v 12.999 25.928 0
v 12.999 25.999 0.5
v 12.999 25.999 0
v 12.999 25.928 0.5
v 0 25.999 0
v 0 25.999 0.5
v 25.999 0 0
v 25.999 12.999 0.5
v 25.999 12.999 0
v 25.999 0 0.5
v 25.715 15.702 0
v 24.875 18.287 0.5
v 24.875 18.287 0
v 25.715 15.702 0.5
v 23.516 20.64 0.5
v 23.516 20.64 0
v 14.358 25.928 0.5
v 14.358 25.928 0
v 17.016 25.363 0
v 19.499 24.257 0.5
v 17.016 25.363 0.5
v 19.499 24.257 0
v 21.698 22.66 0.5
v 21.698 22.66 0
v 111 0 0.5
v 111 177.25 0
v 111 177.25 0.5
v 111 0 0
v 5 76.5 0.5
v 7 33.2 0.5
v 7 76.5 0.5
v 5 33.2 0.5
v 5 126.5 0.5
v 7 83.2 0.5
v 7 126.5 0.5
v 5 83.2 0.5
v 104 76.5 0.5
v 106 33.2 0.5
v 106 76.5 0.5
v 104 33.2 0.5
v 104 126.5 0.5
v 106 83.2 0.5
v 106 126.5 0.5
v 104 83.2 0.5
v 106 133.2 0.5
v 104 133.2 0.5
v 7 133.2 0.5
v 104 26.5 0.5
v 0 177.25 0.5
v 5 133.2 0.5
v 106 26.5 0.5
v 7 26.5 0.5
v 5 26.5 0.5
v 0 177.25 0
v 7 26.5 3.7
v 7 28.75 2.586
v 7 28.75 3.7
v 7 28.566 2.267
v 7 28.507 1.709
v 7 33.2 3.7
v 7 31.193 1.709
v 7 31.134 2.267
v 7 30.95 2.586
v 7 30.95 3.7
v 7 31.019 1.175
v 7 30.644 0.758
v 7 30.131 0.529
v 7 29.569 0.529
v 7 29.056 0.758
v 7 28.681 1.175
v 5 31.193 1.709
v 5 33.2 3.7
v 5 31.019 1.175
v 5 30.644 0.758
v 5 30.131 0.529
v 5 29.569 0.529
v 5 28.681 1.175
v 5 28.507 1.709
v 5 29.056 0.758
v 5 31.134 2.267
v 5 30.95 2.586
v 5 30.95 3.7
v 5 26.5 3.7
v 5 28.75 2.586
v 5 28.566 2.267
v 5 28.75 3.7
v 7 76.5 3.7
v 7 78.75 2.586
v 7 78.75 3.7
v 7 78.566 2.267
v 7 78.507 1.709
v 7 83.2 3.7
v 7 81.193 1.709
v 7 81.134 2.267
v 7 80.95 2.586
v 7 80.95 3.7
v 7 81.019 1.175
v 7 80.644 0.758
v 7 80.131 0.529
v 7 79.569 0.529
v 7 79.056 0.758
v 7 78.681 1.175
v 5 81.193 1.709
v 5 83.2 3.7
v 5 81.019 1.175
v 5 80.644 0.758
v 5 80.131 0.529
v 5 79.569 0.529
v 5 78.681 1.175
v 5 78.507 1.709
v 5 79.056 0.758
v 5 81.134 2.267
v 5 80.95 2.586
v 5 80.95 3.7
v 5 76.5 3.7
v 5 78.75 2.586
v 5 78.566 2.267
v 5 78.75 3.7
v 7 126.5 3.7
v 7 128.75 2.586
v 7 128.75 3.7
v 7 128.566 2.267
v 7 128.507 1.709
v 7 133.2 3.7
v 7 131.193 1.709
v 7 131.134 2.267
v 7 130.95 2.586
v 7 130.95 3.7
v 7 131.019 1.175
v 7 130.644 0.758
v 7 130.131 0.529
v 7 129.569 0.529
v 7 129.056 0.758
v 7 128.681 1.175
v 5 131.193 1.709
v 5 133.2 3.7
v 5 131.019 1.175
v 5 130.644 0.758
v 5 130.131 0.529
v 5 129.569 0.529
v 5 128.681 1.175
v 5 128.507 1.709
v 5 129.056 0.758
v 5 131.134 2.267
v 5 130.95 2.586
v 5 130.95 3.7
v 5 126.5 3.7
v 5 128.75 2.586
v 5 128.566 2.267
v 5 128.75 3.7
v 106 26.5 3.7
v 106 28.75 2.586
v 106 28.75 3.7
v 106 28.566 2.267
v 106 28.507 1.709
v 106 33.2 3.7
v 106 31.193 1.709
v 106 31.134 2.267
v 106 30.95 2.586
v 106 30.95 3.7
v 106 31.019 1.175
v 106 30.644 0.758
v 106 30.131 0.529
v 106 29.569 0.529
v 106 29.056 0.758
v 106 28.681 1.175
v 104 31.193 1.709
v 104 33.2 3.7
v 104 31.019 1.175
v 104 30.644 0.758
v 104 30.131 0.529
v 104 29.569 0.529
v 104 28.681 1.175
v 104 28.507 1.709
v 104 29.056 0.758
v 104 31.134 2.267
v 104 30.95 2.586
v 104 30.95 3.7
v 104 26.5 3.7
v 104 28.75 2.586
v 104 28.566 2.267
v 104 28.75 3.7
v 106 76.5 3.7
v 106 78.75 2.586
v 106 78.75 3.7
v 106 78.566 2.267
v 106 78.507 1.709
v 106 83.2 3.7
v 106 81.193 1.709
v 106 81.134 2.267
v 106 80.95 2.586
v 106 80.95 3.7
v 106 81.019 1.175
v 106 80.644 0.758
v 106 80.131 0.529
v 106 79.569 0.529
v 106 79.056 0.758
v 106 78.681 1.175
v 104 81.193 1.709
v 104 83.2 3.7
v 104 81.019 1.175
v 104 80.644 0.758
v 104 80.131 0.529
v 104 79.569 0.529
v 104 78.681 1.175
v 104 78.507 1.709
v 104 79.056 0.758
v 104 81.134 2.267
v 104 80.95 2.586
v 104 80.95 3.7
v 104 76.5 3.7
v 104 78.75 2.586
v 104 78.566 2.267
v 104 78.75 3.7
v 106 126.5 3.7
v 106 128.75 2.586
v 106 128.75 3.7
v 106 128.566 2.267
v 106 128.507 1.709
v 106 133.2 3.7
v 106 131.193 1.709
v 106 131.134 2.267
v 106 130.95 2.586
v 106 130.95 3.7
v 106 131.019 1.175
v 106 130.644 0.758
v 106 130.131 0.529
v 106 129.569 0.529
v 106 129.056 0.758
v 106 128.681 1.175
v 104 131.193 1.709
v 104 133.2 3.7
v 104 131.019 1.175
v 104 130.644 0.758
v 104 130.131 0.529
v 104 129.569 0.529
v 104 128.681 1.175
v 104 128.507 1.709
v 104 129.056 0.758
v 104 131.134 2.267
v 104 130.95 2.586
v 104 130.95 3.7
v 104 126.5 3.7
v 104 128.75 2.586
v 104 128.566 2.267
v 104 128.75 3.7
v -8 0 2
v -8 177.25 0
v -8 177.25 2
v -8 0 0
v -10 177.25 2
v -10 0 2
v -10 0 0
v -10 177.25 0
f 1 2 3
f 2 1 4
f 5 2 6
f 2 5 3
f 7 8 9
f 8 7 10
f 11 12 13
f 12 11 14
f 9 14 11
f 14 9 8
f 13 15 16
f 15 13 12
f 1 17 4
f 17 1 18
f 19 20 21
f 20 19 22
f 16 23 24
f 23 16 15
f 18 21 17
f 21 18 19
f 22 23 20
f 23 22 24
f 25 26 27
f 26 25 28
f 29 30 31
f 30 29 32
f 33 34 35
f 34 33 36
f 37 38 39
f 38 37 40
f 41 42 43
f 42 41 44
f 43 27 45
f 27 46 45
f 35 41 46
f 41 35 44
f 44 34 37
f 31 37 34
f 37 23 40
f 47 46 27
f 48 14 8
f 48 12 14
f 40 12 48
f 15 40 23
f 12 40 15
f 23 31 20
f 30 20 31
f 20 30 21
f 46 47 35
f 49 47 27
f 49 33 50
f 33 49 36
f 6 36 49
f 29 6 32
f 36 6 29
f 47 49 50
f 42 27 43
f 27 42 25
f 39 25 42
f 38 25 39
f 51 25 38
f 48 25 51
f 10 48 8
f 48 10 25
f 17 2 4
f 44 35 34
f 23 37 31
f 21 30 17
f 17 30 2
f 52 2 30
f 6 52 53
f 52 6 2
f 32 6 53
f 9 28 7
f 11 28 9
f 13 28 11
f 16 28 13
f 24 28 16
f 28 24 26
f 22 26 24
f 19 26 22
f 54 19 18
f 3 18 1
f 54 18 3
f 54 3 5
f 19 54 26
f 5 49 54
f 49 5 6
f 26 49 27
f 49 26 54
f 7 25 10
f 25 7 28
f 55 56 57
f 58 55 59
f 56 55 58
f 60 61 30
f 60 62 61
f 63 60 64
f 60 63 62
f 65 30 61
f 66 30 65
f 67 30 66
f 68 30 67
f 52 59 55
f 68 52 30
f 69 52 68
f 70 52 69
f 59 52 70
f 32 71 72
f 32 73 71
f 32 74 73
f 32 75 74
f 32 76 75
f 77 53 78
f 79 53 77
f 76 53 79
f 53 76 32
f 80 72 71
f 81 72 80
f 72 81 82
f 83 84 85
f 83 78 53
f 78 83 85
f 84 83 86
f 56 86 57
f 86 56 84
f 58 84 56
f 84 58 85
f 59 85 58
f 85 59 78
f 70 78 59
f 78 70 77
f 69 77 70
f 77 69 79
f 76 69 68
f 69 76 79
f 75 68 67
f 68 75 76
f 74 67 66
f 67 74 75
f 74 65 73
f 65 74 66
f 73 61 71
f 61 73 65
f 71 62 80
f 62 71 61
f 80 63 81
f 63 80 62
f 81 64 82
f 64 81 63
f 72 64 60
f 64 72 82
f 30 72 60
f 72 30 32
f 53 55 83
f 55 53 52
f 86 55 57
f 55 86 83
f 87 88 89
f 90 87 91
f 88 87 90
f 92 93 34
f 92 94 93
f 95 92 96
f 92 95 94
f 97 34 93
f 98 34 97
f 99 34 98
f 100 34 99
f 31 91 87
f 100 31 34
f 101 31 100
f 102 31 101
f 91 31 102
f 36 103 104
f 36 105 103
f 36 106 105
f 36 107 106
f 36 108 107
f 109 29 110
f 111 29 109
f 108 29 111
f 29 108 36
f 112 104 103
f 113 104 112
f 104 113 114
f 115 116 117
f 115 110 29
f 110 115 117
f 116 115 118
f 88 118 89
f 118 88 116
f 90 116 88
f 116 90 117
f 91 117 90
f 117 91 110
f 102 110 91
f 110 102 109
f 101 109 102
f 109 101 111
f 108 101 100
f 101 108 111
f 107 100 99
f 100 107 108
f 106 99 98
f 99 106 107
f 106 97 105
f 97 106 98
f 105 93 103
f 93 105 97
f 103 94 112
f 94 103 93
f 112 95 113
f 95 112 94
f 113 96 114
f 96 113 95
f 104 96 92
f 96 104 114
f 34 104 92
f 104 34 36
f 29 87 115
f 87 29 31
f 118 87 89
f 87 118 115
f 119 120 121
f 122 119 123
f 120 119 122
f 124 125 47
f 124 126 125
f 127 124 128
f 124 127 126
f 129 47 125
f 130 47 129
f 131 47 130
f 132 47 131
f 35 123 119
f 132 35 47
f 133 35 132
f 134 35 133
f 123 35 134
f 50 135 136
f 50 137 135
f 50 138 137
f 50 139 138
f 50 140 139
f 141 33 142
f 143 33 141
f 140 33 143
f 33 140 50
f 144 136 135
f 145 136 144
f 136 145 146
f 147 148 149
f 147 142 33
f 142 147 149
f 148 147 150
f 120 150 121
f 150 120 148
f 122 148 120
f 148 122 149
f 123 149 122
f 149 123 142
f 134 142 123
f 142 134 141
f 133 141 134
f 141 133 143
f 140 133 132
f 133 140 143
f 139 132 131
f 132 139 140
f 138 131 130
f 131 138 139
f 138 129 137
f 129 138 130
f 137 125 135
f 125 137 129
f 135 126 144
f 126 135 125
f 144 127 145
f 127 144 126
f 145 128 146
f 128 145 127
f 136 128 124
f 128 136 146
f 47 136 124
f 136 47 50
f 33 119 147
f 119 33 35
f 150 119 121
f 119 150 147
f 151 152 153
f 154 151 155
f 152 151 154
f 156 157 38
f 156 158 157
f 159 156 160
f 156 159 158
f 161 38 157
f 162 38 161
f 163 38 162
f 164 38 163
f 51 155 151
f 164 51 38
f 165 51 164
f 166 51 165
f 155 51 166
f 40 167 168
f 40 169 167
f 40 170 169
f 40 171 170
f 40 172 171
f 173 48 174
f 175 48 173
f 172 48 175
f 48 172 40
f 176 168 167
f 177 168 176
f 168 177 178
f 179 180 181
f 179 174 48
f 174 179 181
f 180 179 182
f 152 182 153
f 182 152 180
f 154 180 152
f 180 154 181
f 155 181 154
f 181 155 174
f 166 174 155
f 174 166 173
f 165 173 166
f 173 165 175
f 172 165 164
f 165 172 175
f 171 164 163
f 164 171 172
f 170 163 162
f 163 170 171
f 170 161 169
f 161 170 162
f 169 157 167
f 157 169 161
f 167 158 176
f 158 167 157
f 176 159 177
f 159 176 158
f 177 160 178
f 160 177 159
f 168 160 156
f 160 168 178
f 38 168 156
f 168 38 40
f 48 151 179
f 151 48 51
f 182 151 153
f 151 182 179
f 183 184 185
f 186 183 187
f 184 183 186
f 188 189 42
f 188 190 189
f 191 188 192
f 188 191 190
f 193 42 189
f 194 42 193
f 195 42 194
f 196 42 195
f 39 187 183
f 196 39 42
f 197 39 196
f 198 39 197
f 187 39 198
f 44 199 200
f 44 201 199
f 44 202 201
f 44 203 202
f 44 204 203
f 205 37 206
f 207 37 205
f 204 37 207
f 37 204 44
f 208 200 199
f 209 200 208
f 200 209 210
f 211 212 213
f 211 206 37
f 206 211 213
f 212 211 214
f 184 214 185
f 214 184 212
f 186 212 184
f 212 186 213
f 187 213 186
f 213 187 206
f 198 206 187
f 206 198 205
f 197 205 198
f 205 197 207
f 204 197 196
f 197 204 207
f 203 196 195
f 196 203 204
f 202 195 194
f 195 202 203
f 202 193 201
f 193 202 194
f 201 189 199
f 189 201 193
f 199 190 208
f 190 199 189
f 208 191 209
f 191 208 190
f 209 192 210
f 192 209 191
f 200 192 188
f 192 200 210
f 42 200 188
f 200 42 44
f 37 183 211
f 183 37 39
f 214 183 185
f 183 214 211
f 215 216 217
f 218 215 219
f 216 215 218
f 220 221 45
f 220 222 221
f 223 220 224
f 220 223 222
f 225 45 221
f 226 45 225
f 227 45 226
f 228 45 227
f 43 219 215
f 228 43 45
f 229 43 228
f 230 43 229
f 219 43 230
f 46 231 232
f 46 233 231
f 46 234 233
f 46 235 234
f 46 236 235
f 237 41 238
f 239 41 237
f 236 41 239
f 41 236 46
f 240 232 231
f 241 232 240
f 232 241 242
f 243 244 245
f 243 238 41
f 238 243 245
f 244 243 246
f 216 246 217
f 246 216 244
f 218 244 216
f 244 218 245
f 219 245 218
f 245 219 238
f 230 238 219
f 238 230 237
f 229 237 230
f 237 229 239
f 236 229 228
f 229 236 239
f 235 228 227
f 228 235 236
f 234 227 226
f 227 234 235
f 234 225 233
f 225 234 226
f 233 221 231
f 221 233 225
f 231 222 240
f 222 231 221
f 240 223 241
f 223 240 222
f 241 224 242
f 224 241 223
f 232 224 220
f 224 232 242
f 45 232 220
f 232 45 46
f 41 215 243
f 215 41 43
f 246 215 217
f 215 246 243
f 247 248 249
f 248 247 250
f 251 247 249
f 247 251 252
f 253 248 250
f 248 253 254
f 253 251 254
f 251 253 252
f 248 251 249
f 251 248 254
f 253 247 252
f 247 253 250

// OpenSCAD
// Surface for the corner of a wire rack

wire_diameter = 2.7;
clip_width = 2;
clip_padding = 5;
platform_width = 111;
platform_height = 0.5;
clip_offset = 26.5; // center of first clip from end
pole_size = 26;
spacing = 50;

clip_outside = 4;
clip_size = wire_diameter + clip_outside;

module clip(pos) {
    color("blue")
    translate(pos)
    translate([clip_width, 0, 0])
    rotate([0, -90, 0])
    linear_extrude(clip_width) {
        difference() {
            square([wire_diameter + .5, clip_size]);
            
            translate([(wire_diameter) / 2, clip_size/2, 0])
            circle(wire_diameter / 2, $fn=15);
            
            translate([1 + (wire_diameter + 2) / 2, clip_size/2, 0])
            square([4, wire_diameter - .5], center = true);
        }
    }
}

union() {
    platform_depth = clip_offset + spacing + spacing + clip_size + (spacing/2-clip_size/2) + 22.4;
    echo(platform_depth = platform_depth);
    translate([-10, 0, 0]) cube([2, platform_depth, 2]);
    difference() {
        cube([platform_width, platform_depth, platform_height]);

        // cutout for pole (bottom left)
        translate([-.001, -.001]) // slight offset so no outside there
        color("red")
        union() {
            cutout_height = 10;
        
            translate([pole_size/2, pole_size/2])
                cylinder(cutout_height, pole_size/2, pole_size/2, center=true);
        
            translate([0, 0, -cutout_height/2]) {
                cube([pole_size/2, pole_size  , cutout_height]);
                cube([pole_size  , pole_size/2, cutout_height]);
            }
        }

        // // cutout for pole (bottom right)
        // translate([.001, .001]) // slight offset so no outside there
        // color("red")
        // union() {
        //     cutout_height = 10;

        //     translate([platform_width - pole_size/2, pole_size/2])
        //         cylinder(cutout_height, pole_size/2, pole_size/2, center=true);

        //     translate([platform_width - pole_size, 0, -cutout_height/2]) {
        //         translate([pole_size/2, 0])
        //             cube([pole_size/2, pole_size, cutout_height]);
        //         cube([pole_size  , pole_size/2, cutout_height]);
        //     }
        // }
    }

    for (x = [clip_padding, platform_width - clip_padding - clip_width]) {
        for (y = [0:2]) {
            clip([x, clip_offset + spacing * y, platform_height]);
        }
    }
}
